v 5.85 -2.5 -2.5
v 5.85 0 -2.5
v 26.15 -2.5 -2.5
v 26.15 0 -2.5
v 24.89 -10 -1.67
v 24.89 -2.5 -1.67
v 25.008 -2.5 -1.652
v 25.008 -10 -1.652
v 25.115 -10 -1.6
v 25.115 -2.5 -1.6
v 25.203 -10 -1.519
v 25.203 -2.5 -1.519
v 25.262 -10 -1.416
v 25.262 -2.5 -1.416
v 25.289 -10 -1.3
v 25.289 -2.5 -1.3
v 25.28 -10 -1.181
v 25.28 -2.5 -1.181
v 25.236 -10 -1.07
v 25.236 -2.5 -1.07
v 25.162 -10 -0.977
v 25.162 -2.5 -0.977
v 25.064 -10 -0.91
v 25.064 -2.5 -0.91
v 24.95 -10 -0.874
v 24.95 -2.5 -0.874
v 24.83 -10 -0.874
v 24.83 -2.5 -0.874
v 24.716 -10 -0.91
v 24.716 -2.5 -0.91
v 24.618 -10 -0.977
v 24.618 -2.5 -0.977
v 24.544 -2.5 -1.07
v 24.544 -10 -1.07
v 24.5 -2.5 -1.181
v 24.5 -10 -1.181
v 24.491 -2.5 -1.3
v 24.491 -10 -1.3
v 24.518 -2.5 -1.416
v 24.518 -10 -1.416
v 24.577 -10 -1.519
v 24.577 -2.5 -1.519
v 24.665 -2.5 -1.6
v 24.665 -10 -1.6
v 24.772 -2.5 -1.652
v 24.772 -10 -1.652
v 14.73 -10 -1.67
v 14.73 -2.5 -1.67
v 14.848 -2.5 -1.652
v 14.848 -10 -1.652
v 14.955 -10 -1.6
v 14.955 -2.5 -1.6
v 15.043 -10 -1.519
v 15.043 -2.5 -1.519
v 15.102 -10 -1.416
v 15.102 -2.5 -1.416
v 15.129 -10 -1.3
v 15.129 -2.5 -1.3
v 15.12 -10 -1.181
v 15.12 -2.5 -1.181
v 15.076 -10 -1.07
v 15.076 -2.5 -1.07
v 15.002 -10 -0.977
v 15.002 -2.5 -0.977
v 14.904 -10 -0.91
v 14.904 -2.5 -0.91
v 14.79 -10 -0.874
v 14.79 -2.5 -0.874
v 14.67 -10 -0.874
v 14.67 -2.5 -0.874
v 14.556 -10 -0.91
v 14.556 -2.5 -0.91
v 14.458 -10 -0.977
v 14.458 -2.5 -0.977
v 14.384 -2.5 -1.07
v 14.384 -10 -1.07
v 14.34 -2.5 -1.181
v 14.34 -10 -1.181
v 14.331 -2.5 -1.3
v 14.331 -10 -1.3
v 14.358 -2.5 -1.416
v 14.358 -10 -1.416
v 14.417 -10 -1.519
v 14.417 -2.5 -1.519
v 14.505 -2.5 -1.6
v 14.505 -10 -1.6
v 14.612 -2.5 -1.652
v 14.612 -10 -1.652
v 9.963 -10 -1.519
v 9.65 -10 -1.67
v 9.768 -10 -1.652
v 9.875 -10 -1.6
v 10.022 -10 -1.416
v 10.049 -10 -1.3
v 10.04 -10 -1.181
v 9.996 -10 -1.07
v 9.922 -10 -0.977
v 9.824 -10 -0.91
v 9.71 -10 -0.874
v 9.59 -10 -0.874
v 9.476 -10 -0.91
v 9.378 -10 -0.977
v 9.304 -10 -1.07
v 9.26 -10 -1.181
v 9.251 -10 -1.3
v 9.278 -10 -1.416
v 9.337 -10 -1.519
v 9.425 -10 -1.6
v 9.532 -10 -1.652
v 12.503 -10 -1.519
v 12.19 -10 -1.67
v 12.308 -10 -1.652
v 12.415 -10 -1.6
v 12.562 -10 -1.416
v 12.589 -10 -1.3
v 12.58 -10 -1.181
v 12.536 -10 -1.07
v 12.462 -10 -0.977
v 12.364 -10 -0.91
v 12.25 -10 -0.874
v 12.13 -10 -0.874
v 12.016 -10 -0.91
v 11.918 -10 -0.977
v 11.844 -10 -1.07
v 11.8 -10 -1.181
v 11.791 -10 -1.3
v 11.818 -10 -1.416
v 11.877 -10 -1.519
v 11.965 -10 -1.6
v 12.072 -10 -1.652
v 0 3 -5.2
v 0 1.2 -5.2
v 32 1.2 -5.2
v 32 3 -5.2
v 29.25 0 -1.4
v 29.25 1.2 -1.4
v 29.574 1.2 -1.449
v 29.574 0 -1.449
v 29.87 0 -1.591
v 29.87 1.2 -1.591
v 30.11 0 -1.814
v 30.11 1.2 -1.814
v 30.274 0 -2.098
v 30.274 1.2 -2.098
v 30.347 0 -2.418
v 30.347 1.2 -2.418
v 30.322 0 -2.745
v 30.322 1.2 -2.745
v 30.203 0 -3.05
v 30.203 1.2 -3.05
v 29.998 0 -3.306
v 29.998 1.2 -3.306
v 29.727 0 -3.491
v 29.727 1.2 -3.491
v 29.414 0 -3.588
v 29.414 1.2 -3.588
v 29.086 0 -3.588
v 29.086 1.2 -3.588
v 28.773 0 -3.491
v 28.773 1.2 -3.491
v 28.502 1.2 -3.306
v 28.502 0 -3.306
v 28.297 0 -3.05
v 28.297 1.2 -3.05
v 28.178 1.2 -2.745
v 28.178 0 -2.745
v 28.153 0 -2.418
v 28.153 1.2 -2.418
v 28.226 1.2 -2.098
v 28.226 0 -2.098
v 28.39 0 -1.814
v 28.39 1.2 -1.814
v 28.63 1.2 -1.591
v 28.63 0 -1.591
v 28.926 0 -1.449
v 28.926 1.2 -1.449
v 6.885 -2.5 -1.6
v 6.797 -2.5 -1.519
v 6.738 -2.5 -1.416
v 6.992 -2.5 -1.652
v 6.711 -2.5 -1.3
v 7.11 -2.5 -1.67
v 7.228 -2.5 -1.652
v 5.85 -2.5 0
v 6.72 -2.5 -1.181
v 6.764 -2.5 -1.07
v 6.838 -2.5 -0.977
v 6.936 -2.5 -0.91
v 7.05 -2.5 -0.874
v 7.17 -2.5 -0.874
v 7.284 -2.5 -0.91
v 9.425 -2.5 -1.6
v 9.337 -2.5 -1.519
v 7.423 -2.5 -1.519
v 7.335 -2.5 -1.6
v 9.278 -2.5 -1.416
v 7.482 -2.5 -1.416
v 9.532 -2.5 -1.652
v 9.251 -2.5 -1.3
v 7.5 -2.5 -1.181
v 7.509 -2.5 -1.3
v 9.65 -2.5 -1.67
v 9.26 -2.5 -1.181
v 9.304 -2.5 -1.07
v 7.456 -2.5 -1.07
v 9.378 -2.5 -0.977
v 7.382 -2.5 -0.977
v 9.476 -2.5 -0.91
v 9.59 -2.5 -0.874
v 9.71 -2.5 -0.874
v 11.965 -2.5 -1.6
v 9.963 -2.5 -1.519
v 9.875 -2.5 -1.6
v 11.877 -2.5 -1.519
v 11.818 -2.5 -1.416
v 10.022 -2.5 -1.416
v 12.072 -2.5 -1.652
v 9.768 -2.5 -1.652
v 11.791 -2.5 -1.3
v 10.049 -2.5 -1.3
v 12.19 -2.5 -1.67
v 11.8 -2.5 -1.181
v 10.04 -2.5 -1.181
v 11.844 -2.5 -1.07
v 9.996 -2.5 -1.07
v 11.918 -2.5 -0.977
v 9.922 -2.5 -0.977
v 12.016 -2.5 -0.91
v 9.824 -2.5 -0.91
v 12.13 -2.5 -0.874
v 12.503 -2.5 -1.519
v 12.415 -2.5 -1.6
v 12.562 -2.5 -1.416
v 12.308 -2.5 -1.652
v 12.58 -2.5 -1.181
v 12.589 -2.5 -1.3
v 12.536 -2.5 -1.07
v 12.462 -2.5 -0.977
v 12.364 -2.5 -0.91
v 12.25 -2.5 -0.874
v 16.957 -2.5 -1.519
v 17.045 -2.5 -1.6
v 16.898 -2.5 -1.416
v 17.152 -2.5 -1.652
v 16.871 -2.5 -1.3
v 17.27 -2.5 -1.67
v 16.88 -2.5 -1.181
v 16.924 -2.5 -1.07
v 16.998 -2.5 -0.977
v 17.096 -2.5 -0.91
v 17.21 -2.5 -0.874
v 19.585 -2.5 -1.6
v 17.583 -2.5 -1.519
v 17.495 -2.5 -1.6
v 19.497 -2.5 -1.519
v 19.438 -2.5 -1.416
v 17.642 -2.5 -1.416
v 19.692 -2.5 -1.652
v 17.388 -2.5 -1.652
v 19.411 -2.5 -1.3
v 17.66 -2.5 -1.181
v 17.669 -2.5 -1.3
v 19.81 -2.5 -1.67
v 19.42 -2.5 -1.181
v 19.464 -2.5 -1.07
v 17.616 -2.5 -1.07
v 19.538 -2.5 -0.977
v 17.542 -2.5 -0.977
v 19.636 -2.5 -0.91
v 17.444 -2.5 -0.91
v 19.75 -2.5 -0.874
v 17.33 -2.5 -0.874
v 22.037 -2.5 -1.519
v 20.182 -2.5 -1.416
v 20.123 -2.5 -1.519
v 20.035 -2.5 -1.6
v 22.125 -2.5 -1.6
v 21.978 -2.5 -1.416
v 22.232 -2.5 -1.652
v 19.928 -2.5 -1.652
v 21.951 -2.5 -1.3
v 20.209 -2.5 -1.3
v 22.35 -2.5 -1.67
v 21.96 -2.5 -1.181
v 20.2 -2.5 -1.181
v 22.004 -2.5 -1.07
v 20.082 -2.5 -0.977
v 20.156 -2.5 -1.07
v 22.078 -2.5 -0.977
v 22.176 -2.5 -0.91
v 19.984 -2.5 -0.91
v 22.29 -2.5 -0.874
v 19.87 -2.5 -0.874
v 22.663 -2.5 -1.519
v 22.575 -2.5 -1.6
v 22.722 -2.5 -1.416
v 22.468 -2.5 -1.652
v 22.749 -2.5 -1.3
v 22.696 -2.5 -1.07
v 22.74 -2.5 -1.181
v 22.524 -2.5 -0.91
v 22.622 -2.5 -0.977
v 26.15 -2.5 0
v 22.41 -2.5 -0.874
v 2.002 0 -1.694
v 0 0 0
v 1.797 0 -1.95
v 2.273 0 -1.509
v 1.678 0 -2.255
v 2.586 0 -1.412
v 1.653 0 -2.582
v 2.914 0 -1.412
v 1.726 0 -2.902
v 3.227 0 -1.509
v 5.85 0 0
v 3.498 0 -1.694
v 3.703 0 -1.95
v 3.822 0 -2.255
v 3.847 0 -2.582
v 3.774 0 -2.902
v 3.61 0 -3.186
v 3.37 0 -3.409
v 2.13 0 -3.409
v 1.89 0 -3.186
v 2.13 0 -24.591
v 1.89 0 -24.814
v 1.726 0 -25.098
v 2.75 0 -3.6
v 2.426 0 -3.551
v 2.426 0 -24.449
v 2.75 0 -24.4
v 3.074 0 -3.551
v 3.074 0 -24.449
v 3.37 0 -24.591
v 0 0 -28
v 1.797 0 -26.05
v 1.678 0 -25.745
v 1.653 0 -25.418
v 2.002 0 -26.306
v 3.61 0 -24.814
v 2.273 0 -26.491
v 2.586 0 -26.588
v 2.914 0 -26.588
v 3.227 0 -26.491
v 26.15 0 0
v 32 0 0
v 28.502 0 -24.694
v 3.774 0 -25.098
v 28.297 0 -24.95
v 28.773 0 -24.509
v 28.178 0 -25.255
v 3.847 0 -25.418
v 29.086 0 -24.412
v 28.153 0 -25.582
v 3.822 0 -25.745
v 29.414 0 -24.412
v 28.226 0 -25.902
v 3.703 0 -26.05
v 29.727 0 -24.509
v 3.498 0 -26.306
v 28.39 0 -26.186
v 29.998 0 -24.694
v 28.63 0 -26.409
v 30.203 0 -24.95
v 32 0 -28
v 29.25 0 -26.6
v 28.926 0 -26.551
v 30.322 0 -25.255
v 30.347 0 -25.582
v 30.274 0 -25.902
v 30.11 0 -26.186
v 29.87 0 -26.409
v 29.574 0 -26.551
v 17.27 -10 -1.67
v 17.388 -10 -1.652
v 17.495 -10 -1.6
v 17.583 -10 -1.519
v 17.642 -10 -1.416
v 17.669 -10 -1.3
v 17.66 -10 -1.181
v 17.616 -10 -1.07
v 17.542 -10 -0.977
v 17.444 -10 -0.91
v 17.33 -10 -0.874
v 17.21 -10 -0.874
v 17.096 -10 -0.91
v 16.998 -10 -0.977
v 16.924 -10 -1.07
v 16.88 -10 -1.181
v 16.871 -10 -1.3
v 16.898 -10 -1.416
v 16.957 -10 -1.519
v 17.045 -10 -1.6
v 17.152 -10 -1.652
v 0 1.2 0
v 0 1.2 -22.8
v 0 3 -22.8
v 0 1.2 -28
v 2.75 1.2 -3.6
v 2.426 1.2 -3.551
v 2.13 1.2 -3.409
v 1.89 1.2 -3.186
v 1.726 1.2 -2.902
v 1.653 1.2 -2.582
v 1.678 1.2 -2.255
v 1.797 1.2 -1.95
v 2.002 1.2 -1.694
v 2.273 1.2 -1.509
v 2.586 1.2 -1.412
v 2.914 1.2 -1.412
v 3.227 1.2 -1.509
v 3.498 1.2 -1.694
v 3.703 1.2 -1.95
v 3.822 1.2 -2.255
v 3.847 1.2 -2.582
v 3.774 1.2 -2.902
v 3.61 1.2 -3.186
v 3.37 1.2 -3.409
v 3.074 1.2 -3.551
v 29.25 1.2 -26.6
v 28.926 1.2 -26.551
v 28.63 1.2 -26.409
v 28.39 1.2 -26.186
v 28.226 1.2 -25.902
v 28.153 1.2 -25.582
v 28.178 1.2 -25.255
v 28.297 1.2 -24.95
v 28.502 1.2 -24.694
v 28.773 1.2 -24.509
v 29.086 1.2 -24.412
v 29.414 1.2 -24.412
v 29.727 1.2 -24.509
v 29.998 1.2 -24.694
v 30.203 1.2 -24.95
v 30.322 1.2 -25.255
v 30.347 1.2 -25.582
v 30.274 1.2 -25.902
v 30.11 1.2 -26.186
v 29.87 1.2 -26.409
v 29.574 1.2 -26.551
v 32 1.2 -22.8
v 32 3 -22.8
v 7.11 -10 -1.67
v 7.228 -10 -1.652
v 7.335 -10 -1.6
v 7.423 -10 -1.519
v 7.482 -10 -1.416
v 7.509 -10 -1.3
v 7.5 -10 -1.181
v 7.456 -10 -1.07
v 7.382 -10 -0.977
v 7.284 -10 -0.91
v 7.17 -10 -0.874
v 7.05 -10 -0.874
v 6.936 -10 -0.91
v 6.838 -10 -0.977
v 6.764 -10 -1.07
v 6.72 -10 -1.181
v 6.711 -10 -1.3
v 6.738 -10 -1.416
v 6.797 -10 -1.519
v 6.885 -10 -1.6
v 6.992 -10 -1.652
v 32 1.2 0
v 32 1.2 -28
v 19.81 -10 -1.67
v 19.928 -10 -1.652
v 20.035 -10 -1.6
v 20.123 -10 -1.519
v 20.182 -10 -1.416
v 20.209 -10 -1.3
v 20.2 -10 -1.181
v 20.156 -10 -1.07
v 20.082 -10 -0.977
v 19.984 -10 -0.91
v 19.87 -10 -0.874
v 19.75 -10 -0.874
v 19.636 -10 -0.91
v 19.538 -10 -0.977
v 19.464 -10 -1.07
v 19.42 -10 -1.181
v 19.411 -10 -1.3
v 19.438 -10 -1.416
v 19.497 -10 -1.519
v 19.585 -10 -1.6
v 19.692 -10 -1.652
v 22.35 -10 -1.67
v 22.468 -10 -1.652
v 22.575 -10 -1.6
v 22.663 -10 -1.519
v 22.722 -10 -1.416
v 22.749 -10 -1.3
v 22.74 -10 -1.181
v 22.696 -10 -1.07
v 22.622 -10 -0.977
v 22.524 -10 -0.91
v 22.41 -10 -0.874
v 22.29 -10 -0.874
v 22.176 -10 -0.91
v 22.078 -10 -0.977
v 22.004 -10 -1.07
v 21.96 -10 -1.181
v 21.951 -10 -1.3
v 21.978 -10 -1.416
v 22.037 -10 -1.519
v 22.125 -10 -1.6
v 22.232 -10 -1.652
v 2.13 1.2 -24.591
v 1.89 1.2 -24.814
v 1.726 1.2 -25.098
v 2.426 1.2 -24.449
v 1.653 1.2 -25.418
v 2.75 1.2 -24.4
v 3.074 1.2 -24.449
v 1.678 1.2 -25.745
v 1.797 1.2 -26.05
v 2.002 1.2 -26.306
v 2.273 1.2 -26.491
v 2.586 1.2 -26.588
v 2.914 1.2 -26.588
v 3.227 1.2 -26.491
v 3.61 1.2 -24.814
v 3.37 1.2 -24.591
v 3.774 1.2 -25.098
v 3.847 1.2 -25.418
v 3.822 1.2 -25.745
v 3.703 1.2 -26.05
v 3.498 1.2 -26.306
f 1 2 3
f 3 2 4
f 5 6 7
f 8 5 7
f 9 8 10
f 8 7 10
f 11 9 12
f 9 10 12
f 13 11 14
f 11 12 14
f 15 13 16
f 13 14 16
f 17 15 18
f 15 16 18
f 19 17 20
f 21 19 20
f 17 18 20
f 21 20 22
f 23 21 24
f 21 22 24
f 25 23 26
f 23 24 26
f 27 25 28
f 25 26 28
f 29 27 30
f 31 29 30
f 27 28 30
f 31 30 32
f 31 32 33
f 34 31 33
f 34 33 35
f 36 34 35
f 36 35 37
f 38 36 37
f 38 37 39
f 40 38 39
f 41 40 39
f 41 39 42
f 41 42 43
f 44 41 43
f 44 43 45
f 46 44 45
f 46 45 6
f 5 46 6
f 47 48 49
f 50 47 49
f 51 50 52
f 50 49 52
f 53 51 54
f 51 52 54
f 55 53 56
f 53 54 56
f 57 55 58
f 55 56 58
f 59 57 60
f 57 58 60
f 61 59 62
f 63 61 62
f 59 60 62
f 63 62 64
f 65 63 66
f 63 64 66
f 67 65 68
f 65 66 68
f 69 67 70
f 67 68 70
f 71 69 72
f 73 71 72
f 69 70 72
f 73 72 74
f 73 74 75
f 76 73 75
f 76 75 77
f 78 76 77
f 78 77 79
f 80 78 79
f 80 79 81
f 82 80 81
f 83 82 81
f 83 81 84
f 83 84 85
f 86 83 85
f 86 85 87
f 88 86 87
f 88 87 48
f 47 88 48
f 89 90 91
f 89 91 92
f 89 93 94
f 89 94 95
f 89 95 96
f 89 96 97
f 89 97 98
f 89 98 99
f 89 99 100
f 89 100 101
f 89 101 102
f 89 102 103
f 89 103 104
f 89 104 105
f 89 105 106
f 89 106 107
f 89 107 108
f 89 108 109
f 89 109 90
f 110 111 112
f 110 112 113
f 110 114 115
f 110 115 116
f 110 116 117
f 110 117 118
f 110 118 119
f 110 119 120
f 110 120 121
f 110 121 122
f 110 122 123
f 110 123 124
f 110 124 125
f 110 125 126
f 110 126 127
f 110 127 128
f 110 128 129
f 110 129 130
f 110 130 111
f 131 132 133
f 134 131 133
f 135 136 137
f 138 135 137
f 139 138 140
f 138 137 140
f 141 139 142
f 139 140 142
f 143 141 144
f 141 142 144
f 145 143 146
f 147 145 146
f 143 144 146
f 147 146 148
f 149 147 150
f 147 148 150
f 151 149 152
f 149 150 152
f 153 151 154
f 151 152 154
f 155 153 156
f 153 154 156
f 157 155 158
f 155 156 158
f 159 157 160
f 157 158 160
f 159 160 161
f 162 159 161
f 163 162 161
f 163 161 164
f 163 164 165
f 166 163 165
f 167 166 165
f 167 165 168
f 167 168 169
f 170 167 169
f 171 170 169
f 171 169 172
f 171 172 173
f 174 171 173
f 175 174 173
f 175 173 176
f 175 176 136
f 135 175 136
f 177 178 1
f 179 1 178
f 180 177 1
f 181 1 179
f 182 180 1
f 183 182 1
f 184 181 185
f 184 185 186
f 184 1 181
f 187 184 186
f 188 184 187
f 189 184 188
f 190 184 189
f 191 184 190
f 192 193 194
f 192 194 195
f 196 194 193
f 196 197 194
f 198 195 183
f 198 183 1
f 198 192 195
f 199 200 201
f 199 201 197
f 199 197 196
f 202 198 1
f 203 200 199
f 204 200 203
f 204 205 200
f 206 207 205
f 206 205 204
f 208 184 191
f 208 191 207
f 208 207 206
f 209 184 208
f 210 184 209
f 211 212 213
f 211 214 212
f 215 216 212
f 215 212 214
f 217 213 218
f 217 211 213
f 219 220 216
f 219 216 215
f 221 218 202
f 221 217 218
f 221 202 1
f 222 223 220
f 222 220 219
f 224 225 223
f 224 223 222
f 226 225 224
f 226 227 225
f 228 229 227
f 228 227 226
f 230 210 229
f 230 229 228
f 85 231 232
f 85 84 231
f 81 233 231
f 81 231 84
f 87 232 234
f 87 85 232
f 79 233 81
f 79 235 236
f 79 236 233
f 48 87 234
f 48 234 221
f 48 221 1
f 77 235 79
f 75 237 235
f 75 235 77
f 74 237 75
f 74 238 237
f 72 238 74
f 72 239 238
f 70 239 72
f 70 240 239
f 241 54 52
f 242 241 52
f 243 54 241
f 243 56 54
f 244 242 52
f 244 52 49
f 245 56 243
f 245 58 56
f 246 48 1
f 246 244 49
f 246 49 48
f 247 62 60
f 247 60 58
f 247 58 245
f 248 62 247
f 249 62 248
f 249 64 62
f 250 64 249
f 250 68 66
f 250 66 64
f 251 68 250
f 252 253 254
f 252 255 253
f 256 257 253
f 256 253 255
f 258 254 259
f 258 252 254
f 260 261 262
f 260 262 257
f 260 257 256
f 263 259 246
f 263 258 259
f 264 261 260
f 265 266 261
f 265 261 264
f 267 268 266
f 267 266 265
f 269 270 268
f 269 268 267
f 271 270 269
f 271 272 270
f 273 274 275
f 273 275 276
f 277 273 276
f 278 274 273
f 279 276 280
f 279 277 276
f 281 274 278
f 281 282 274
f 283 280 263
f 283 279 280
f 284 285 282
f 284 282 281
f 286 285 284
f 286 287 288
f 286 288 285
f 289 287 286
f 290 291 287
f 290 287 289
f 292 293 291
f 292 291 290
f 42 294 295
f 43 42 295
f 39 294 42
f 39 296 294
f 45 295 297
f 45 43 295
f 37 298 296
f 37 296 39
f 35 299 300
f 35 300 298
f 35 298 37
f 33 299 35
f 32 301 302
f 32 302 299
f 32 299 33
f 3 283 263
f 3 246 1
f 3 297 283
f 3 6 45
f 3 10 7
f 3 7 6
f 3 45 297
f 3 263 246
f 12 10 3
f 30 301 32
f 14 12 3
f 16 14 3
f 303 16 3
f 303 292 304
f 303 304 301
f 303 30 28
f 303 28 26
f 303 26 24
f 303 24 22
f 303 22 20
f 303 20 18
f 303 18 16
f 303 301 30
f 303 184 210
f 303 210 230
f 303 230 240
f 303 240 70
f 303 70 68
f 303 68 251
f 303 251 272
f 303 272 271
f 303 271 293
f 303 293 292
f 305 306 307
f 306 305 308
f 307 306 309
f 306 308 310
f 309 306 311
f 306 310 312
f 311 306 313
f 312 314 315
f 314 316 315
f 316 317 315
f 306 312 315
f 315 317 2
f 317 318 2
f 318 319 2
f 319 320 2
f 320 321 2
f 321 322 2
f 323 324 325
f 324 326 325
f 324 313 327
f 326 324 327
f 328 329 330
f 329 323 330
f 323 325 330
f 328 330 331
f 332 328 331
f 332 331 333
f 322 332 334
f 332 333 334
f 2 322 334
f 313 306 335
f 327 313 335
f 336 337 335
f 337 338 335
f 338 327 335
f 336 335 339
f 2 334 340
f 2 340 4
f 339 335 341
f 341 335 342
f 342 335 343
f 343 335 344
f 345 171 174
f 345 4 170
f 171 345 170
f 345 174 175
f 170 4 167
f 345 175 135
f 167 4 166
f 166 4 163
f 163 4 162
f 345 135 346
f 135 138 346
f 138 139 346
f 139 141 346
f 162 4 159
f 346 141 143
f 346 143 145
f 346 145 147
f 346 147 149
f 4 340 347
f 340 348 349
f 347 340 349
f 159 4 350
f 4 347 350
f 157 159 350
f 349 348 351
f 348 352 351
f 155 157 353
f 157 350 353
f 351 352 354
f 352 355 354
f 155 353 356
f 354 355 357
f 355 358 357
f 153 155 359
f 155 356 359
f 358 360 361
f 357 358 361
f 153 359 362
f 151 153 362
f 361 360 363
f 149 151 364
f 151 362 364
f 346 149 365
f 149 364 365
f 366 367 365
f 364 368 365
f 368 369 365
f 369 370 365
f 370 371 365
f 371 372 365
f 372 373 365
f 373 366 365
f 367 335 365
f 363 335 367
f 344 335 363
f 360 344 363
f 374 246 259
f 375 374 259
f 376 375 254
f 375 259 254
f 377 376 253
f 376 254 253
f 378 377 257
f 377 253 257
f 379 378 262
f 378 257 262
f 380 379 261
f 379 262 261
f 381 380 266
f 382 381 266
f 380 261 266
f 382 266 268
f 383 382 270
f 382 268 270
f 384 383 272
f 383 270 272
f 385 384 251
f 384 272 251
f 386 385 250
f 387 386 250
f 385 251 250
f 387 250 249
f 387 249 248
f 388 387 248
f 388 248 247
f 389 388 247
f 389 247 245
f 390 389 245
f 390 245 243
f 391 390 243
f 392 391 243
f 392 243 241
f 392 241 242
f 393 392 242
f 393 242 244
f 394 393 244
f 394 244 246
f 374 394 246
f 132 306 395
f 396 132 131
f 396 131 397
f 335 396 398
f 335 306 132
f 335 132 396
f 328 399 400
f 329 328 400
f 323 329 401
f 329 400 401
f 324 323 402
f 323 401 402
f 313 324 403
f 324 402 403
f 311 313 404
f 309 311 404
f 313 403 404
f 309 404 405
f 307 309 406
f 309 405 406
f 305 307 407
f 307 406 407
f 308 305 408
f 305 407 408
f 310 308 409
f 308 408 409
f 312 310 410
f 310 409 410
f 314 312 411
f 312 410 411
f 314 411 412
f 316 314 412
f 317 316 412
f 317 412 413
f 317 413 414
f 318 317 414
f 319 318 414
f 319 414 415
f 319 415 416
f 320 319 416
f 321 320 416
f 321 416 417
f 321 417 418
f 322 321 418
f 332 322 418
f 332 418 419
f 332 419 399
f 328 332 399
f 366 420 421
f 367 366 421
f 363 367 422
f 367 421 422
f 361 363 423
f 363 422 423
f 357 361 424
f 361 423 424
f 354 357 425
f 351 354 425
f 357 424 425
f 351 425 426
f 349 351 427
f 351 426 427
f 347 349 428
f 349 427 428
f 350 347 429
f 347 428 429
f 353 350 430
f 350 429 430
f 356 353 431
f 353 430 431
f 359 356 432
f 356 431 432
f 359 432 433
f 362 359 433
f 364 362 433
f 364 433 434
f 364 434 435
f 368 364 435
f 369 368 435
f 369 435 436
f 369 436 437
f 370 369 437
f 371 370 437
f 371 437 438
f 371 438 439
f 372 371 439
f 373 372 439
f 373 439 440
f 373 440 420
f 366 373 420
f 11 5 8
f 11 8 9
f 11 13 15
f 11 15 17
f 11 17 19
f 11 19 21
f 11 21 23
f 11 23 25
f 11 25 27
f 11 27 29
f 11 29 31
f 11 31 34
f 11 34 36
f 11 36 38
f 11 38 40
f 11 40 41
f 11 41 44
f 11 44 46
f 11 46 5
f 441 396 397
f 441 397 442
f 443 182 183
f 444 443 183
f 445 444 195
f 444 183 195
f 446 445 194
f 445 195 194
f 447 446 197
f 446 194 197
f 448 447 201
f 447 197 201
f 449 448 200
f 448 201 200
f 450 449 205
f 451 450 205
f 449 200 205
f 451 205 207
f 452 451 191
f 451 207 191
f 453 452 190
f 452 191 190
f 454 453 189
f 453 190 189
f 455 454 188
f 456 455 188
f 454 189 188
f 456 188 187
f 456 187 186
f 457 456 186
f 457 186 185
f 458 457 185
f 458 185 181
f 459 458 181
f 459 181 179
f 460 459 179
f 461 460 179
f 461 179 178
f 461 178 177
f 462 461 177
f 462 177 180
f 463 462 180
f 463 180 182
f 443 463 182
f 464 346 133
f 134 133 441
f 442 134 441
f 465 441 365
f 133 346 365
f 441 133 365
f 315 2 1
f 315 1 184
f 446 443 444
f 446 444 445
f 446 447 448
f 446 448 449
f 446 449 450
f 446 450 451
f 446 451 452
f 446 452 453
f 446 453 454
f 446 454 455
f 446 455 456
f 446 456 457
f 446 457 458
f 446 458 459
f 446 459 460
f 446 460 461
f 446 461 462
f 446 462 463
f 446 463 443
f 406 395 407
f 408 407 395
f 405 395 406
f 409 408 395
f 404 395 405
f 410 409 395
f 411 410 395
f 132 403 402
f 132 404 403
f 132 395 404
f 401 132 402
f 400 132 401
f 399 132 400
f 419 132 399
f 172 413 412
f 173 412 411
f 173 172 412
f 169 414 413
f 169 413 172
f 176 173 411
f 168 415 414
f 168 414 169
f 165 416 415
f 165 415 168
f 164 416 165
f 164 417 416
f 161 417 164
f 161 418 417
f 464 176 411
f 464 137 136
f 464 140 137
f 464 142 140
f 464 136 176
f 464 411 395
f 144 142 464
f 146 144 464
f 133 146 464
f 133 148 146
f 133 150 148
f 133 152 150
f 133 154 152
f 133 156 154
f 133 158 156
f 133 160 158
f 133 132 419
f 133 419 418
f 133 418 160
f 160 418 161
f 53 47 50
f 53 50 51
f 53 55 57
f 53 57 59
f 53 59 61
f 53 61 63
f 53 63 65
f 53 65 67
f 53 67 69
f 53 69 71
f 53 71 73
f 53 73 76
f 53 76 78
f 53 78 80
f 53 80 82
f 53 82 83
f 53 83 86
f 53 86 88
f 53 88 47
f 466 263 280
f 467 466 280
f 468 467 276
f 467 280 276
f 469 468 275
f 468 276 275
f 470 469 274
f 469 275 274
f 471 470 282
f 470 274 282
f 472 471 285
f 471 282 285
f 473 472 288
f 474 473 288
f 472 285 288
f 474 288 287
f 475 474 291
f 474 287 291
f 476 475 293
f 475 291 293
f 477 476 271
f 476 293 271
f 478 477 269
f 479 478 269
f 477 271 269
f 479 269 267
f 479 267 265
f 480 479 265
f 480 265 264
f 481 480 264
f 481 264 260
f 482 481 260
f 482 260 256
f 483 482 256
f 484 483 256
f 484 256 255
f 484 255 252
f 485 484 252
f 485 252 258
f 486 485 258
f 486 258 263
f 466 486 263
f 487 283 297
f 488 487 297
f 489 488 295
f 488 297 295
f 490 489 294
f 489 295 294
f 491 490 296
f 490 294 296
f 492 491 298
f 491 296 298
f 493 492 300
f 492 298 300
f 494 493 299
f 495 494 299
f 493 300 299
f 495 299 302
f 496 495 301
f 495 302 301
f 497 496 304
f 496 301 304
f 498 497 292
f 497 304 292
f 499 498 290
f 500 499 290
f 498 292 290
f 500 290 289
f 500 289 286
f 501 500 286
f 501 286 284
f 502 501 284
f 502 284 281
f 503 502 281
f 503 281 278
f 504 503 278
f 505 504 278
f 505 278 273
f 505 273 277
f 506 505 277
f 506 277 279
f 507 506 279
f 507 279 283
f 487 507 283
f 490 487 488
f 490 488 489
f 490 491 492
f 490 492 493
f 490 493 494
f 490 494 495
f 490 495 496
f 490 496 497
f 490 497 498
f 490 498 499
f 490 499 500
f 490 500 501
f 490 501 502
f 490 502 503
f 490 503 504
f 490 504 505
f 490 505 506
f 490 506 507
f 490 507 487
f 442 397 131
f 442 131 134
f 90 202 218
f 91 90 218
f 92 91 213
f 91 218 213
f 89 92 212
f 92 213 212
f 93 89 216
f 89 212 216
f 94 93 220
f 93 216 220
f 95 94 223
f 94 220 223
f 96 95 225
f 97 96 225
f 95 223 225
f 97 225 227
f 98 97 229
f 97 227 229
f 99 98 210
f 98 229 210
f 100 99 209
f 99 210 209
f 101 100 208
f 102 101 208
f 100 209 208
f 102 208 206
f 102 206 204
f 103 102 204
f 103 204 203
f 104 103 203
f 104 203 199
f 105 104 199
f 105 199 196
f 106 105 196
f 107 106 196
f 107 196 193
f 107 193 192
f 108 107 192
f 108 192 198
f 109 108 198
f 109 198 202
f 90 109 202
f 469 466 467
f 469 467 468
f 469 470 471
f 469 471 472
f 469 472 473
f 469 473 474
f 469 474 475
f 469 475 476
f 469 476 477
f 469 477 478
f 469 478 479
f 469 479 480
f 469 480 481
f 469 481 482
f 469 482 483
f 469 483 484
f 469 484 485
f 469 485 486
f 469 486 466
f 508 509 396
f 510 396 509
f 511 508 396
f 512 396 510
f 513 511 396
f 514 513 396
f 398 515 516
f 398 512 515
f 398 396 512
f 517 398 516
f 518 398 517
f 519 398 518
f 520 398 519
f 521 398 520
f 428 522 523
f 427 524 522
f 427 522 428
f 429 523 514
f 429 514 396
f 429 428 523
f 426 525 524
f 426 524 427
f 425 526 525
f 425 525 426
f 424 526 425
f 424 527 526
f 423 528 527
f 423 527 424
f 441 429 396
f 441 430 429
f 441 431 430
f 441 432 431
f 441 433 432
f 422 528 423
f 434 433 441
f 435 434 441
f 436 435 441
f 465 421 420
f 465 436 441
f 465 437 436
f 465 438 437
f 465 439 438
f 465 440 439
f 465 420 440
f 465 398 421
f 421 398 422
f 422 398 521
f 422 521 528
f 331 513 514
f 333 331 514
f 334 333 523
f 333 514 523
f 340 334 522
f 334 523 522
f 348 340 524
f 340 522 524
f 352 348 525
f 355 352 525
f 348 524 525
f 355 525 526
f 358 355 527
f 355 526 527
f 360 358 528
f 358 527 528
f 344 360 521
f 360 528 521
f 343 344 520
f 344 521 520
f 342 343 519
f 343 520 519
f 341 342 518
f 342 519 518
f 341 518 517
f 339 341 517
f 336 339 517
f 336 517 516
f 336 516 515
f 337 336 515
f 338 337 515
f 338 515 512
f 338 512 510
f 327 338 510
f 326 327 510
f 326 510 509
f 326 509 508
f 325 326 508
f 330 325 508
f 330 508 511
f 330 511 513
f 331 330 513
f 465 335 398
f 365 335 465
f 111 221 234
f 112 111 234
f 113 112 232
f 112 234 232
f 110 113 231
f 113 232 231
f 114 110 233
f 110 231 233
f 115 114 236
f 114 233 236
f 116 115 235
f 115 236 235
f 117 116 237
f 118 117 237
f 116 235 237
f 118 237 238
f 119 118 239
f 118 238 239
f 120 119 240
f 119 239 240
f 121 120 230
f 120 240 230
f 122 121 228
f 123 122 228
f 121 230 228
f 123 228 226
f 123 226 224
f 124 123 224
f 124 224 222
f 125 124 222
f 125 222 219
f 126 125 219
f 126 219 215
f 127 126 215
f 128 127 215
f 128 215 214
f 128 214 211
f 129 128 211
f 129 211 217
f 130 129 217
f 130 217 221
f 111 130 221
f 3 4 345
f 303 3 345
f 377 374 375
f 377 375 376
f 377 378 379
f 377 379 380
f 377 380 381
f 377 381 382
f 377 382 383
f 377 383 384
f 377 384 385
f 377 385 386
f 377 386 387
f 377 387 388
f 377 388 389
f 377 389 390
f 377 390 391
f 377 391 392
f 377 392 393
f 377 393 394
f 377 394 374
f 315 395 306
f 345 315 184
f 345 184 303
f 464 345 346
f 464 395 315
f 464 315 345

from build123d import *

# Parameters (mm, degrees)
SKETCH_1_W          = 32
SKETCH_1_H          = 28
EXTRUDE_1_DEPTH     = 1.2
SKETCH_2_W          = 32
SKETCH_2_H          = 17.6
EXTRUDE_2_DEPTH     = 1.8
SKETCH_3_R          = 1.1
CUT_EXTRUDE_1_DEPTH = 43.558665393
SKETCH_4_R          = 0.4
EXTRUDE_3_DEPTH     = 10
SKETCH_5_W          = 20.3
SKETCH_5_H          = 2.5
EXTRUDE_4_DEPTH     = 2.5


with BuildPart() as part:
    # 草图1 → 凸台-拉伸1 (new body)
    with BuildSketch(Plane(origin=(0, 0, 0), x_dir=(1, 0, 0), z_dir=(0, 1, 0))):
        with Locations((16, 14)):
            Rectangle(SKETCH_1_W, SKETCH_1_H)
    extrude(amount=EXTRUDE_1_DEPTH)

    # 草图2 → 凸台-拉伸2 (add)
    with BuildSketch(Plane(origin=(0, 1.2, 0), x_dir=(1, 0, 0), z_dir=(0, 1, 0))):
        with Locations((16, 14)):
            Rectangle(SKETCH_2_W, SKETCH_2_H)
    extrude(amount=EXTRUDE_2_DEPTH)

    # 草图3 → 切除-拉伸1 (cut, through all)
    with BuildSketch(Plane(origin=(0, 1.2, 0), x_dir=(1, 0, 0), z_dir=(0, 1, 0))):
        with Locations(Location((2.75, 25.5, 0), (0, 0, 270))):
            Circle(SKETCH_3_R)
        with Locations(Location((2.75, 2.5, 0), (0, 0, 90))):
            Circle(SKETCH_3_R)
        with Locations(Location((29.25, 2.5, 0), (0, 0, 270))):
            Circle(SKETCH_3_R)
        with Locations(Location((29.25, 25.5, 0), (0, 0, 90))):
            Circle(SKETCH_3_R)
    extrude(amount=-CUT_EXTRUDE_1_DEPTH, mode=Mode.SUBTRACT)

    # 草图4 → 凸台-拉伸3 (add)
    with BuildSketch(Plane.XZ):
        with Locations(Location((7.11, -1.27, 0), (0, 0, 270))):
            Circle(SKETCH_4_R)
        with Locations(Location((9.65, -1.27, 0), (0, 0, 270))):
            Circle(SKETCH_4_R)
        with Locations(Location((12.19, -1.27, 0), (0, 0, 270))):
            Circle(SKETCH_4_R)
        with Locations(Location((14.73, -1.27, 0), (0, 0, 270))):
            Circle(SKETCH_4_R)
        with Locations(Location((17.27, -1.27, 0), (0, 0, 270))):
            Circle(SKETCH_4_R)
        with Locations(Location((19.81, -1.27, 0), (0, 0, 270))):
            Circle(SKETCH_4_R)
        with Locations(Location((22.35, -1.27, 0), (0, 0, 270))):
            Circle(SKETCH_4_R)
        with Locations(Location((24.89, -1.27, 0), (0, 0, 270))):
            Circle(SKETCH_4_R)
    extrude(amount=EXTRUDE_3_DEPTH)

    # 草图5 → 凸台-拉伸4 (add)
    with BuildSketch(Plane.XZ):
        with Locations((16, -1.25)):
            Rectangle(SKETCH_5_W, SKETCH_5_H)
    extrude(amount=EXTRUDE_4_DEPTH)


solid = part.part
